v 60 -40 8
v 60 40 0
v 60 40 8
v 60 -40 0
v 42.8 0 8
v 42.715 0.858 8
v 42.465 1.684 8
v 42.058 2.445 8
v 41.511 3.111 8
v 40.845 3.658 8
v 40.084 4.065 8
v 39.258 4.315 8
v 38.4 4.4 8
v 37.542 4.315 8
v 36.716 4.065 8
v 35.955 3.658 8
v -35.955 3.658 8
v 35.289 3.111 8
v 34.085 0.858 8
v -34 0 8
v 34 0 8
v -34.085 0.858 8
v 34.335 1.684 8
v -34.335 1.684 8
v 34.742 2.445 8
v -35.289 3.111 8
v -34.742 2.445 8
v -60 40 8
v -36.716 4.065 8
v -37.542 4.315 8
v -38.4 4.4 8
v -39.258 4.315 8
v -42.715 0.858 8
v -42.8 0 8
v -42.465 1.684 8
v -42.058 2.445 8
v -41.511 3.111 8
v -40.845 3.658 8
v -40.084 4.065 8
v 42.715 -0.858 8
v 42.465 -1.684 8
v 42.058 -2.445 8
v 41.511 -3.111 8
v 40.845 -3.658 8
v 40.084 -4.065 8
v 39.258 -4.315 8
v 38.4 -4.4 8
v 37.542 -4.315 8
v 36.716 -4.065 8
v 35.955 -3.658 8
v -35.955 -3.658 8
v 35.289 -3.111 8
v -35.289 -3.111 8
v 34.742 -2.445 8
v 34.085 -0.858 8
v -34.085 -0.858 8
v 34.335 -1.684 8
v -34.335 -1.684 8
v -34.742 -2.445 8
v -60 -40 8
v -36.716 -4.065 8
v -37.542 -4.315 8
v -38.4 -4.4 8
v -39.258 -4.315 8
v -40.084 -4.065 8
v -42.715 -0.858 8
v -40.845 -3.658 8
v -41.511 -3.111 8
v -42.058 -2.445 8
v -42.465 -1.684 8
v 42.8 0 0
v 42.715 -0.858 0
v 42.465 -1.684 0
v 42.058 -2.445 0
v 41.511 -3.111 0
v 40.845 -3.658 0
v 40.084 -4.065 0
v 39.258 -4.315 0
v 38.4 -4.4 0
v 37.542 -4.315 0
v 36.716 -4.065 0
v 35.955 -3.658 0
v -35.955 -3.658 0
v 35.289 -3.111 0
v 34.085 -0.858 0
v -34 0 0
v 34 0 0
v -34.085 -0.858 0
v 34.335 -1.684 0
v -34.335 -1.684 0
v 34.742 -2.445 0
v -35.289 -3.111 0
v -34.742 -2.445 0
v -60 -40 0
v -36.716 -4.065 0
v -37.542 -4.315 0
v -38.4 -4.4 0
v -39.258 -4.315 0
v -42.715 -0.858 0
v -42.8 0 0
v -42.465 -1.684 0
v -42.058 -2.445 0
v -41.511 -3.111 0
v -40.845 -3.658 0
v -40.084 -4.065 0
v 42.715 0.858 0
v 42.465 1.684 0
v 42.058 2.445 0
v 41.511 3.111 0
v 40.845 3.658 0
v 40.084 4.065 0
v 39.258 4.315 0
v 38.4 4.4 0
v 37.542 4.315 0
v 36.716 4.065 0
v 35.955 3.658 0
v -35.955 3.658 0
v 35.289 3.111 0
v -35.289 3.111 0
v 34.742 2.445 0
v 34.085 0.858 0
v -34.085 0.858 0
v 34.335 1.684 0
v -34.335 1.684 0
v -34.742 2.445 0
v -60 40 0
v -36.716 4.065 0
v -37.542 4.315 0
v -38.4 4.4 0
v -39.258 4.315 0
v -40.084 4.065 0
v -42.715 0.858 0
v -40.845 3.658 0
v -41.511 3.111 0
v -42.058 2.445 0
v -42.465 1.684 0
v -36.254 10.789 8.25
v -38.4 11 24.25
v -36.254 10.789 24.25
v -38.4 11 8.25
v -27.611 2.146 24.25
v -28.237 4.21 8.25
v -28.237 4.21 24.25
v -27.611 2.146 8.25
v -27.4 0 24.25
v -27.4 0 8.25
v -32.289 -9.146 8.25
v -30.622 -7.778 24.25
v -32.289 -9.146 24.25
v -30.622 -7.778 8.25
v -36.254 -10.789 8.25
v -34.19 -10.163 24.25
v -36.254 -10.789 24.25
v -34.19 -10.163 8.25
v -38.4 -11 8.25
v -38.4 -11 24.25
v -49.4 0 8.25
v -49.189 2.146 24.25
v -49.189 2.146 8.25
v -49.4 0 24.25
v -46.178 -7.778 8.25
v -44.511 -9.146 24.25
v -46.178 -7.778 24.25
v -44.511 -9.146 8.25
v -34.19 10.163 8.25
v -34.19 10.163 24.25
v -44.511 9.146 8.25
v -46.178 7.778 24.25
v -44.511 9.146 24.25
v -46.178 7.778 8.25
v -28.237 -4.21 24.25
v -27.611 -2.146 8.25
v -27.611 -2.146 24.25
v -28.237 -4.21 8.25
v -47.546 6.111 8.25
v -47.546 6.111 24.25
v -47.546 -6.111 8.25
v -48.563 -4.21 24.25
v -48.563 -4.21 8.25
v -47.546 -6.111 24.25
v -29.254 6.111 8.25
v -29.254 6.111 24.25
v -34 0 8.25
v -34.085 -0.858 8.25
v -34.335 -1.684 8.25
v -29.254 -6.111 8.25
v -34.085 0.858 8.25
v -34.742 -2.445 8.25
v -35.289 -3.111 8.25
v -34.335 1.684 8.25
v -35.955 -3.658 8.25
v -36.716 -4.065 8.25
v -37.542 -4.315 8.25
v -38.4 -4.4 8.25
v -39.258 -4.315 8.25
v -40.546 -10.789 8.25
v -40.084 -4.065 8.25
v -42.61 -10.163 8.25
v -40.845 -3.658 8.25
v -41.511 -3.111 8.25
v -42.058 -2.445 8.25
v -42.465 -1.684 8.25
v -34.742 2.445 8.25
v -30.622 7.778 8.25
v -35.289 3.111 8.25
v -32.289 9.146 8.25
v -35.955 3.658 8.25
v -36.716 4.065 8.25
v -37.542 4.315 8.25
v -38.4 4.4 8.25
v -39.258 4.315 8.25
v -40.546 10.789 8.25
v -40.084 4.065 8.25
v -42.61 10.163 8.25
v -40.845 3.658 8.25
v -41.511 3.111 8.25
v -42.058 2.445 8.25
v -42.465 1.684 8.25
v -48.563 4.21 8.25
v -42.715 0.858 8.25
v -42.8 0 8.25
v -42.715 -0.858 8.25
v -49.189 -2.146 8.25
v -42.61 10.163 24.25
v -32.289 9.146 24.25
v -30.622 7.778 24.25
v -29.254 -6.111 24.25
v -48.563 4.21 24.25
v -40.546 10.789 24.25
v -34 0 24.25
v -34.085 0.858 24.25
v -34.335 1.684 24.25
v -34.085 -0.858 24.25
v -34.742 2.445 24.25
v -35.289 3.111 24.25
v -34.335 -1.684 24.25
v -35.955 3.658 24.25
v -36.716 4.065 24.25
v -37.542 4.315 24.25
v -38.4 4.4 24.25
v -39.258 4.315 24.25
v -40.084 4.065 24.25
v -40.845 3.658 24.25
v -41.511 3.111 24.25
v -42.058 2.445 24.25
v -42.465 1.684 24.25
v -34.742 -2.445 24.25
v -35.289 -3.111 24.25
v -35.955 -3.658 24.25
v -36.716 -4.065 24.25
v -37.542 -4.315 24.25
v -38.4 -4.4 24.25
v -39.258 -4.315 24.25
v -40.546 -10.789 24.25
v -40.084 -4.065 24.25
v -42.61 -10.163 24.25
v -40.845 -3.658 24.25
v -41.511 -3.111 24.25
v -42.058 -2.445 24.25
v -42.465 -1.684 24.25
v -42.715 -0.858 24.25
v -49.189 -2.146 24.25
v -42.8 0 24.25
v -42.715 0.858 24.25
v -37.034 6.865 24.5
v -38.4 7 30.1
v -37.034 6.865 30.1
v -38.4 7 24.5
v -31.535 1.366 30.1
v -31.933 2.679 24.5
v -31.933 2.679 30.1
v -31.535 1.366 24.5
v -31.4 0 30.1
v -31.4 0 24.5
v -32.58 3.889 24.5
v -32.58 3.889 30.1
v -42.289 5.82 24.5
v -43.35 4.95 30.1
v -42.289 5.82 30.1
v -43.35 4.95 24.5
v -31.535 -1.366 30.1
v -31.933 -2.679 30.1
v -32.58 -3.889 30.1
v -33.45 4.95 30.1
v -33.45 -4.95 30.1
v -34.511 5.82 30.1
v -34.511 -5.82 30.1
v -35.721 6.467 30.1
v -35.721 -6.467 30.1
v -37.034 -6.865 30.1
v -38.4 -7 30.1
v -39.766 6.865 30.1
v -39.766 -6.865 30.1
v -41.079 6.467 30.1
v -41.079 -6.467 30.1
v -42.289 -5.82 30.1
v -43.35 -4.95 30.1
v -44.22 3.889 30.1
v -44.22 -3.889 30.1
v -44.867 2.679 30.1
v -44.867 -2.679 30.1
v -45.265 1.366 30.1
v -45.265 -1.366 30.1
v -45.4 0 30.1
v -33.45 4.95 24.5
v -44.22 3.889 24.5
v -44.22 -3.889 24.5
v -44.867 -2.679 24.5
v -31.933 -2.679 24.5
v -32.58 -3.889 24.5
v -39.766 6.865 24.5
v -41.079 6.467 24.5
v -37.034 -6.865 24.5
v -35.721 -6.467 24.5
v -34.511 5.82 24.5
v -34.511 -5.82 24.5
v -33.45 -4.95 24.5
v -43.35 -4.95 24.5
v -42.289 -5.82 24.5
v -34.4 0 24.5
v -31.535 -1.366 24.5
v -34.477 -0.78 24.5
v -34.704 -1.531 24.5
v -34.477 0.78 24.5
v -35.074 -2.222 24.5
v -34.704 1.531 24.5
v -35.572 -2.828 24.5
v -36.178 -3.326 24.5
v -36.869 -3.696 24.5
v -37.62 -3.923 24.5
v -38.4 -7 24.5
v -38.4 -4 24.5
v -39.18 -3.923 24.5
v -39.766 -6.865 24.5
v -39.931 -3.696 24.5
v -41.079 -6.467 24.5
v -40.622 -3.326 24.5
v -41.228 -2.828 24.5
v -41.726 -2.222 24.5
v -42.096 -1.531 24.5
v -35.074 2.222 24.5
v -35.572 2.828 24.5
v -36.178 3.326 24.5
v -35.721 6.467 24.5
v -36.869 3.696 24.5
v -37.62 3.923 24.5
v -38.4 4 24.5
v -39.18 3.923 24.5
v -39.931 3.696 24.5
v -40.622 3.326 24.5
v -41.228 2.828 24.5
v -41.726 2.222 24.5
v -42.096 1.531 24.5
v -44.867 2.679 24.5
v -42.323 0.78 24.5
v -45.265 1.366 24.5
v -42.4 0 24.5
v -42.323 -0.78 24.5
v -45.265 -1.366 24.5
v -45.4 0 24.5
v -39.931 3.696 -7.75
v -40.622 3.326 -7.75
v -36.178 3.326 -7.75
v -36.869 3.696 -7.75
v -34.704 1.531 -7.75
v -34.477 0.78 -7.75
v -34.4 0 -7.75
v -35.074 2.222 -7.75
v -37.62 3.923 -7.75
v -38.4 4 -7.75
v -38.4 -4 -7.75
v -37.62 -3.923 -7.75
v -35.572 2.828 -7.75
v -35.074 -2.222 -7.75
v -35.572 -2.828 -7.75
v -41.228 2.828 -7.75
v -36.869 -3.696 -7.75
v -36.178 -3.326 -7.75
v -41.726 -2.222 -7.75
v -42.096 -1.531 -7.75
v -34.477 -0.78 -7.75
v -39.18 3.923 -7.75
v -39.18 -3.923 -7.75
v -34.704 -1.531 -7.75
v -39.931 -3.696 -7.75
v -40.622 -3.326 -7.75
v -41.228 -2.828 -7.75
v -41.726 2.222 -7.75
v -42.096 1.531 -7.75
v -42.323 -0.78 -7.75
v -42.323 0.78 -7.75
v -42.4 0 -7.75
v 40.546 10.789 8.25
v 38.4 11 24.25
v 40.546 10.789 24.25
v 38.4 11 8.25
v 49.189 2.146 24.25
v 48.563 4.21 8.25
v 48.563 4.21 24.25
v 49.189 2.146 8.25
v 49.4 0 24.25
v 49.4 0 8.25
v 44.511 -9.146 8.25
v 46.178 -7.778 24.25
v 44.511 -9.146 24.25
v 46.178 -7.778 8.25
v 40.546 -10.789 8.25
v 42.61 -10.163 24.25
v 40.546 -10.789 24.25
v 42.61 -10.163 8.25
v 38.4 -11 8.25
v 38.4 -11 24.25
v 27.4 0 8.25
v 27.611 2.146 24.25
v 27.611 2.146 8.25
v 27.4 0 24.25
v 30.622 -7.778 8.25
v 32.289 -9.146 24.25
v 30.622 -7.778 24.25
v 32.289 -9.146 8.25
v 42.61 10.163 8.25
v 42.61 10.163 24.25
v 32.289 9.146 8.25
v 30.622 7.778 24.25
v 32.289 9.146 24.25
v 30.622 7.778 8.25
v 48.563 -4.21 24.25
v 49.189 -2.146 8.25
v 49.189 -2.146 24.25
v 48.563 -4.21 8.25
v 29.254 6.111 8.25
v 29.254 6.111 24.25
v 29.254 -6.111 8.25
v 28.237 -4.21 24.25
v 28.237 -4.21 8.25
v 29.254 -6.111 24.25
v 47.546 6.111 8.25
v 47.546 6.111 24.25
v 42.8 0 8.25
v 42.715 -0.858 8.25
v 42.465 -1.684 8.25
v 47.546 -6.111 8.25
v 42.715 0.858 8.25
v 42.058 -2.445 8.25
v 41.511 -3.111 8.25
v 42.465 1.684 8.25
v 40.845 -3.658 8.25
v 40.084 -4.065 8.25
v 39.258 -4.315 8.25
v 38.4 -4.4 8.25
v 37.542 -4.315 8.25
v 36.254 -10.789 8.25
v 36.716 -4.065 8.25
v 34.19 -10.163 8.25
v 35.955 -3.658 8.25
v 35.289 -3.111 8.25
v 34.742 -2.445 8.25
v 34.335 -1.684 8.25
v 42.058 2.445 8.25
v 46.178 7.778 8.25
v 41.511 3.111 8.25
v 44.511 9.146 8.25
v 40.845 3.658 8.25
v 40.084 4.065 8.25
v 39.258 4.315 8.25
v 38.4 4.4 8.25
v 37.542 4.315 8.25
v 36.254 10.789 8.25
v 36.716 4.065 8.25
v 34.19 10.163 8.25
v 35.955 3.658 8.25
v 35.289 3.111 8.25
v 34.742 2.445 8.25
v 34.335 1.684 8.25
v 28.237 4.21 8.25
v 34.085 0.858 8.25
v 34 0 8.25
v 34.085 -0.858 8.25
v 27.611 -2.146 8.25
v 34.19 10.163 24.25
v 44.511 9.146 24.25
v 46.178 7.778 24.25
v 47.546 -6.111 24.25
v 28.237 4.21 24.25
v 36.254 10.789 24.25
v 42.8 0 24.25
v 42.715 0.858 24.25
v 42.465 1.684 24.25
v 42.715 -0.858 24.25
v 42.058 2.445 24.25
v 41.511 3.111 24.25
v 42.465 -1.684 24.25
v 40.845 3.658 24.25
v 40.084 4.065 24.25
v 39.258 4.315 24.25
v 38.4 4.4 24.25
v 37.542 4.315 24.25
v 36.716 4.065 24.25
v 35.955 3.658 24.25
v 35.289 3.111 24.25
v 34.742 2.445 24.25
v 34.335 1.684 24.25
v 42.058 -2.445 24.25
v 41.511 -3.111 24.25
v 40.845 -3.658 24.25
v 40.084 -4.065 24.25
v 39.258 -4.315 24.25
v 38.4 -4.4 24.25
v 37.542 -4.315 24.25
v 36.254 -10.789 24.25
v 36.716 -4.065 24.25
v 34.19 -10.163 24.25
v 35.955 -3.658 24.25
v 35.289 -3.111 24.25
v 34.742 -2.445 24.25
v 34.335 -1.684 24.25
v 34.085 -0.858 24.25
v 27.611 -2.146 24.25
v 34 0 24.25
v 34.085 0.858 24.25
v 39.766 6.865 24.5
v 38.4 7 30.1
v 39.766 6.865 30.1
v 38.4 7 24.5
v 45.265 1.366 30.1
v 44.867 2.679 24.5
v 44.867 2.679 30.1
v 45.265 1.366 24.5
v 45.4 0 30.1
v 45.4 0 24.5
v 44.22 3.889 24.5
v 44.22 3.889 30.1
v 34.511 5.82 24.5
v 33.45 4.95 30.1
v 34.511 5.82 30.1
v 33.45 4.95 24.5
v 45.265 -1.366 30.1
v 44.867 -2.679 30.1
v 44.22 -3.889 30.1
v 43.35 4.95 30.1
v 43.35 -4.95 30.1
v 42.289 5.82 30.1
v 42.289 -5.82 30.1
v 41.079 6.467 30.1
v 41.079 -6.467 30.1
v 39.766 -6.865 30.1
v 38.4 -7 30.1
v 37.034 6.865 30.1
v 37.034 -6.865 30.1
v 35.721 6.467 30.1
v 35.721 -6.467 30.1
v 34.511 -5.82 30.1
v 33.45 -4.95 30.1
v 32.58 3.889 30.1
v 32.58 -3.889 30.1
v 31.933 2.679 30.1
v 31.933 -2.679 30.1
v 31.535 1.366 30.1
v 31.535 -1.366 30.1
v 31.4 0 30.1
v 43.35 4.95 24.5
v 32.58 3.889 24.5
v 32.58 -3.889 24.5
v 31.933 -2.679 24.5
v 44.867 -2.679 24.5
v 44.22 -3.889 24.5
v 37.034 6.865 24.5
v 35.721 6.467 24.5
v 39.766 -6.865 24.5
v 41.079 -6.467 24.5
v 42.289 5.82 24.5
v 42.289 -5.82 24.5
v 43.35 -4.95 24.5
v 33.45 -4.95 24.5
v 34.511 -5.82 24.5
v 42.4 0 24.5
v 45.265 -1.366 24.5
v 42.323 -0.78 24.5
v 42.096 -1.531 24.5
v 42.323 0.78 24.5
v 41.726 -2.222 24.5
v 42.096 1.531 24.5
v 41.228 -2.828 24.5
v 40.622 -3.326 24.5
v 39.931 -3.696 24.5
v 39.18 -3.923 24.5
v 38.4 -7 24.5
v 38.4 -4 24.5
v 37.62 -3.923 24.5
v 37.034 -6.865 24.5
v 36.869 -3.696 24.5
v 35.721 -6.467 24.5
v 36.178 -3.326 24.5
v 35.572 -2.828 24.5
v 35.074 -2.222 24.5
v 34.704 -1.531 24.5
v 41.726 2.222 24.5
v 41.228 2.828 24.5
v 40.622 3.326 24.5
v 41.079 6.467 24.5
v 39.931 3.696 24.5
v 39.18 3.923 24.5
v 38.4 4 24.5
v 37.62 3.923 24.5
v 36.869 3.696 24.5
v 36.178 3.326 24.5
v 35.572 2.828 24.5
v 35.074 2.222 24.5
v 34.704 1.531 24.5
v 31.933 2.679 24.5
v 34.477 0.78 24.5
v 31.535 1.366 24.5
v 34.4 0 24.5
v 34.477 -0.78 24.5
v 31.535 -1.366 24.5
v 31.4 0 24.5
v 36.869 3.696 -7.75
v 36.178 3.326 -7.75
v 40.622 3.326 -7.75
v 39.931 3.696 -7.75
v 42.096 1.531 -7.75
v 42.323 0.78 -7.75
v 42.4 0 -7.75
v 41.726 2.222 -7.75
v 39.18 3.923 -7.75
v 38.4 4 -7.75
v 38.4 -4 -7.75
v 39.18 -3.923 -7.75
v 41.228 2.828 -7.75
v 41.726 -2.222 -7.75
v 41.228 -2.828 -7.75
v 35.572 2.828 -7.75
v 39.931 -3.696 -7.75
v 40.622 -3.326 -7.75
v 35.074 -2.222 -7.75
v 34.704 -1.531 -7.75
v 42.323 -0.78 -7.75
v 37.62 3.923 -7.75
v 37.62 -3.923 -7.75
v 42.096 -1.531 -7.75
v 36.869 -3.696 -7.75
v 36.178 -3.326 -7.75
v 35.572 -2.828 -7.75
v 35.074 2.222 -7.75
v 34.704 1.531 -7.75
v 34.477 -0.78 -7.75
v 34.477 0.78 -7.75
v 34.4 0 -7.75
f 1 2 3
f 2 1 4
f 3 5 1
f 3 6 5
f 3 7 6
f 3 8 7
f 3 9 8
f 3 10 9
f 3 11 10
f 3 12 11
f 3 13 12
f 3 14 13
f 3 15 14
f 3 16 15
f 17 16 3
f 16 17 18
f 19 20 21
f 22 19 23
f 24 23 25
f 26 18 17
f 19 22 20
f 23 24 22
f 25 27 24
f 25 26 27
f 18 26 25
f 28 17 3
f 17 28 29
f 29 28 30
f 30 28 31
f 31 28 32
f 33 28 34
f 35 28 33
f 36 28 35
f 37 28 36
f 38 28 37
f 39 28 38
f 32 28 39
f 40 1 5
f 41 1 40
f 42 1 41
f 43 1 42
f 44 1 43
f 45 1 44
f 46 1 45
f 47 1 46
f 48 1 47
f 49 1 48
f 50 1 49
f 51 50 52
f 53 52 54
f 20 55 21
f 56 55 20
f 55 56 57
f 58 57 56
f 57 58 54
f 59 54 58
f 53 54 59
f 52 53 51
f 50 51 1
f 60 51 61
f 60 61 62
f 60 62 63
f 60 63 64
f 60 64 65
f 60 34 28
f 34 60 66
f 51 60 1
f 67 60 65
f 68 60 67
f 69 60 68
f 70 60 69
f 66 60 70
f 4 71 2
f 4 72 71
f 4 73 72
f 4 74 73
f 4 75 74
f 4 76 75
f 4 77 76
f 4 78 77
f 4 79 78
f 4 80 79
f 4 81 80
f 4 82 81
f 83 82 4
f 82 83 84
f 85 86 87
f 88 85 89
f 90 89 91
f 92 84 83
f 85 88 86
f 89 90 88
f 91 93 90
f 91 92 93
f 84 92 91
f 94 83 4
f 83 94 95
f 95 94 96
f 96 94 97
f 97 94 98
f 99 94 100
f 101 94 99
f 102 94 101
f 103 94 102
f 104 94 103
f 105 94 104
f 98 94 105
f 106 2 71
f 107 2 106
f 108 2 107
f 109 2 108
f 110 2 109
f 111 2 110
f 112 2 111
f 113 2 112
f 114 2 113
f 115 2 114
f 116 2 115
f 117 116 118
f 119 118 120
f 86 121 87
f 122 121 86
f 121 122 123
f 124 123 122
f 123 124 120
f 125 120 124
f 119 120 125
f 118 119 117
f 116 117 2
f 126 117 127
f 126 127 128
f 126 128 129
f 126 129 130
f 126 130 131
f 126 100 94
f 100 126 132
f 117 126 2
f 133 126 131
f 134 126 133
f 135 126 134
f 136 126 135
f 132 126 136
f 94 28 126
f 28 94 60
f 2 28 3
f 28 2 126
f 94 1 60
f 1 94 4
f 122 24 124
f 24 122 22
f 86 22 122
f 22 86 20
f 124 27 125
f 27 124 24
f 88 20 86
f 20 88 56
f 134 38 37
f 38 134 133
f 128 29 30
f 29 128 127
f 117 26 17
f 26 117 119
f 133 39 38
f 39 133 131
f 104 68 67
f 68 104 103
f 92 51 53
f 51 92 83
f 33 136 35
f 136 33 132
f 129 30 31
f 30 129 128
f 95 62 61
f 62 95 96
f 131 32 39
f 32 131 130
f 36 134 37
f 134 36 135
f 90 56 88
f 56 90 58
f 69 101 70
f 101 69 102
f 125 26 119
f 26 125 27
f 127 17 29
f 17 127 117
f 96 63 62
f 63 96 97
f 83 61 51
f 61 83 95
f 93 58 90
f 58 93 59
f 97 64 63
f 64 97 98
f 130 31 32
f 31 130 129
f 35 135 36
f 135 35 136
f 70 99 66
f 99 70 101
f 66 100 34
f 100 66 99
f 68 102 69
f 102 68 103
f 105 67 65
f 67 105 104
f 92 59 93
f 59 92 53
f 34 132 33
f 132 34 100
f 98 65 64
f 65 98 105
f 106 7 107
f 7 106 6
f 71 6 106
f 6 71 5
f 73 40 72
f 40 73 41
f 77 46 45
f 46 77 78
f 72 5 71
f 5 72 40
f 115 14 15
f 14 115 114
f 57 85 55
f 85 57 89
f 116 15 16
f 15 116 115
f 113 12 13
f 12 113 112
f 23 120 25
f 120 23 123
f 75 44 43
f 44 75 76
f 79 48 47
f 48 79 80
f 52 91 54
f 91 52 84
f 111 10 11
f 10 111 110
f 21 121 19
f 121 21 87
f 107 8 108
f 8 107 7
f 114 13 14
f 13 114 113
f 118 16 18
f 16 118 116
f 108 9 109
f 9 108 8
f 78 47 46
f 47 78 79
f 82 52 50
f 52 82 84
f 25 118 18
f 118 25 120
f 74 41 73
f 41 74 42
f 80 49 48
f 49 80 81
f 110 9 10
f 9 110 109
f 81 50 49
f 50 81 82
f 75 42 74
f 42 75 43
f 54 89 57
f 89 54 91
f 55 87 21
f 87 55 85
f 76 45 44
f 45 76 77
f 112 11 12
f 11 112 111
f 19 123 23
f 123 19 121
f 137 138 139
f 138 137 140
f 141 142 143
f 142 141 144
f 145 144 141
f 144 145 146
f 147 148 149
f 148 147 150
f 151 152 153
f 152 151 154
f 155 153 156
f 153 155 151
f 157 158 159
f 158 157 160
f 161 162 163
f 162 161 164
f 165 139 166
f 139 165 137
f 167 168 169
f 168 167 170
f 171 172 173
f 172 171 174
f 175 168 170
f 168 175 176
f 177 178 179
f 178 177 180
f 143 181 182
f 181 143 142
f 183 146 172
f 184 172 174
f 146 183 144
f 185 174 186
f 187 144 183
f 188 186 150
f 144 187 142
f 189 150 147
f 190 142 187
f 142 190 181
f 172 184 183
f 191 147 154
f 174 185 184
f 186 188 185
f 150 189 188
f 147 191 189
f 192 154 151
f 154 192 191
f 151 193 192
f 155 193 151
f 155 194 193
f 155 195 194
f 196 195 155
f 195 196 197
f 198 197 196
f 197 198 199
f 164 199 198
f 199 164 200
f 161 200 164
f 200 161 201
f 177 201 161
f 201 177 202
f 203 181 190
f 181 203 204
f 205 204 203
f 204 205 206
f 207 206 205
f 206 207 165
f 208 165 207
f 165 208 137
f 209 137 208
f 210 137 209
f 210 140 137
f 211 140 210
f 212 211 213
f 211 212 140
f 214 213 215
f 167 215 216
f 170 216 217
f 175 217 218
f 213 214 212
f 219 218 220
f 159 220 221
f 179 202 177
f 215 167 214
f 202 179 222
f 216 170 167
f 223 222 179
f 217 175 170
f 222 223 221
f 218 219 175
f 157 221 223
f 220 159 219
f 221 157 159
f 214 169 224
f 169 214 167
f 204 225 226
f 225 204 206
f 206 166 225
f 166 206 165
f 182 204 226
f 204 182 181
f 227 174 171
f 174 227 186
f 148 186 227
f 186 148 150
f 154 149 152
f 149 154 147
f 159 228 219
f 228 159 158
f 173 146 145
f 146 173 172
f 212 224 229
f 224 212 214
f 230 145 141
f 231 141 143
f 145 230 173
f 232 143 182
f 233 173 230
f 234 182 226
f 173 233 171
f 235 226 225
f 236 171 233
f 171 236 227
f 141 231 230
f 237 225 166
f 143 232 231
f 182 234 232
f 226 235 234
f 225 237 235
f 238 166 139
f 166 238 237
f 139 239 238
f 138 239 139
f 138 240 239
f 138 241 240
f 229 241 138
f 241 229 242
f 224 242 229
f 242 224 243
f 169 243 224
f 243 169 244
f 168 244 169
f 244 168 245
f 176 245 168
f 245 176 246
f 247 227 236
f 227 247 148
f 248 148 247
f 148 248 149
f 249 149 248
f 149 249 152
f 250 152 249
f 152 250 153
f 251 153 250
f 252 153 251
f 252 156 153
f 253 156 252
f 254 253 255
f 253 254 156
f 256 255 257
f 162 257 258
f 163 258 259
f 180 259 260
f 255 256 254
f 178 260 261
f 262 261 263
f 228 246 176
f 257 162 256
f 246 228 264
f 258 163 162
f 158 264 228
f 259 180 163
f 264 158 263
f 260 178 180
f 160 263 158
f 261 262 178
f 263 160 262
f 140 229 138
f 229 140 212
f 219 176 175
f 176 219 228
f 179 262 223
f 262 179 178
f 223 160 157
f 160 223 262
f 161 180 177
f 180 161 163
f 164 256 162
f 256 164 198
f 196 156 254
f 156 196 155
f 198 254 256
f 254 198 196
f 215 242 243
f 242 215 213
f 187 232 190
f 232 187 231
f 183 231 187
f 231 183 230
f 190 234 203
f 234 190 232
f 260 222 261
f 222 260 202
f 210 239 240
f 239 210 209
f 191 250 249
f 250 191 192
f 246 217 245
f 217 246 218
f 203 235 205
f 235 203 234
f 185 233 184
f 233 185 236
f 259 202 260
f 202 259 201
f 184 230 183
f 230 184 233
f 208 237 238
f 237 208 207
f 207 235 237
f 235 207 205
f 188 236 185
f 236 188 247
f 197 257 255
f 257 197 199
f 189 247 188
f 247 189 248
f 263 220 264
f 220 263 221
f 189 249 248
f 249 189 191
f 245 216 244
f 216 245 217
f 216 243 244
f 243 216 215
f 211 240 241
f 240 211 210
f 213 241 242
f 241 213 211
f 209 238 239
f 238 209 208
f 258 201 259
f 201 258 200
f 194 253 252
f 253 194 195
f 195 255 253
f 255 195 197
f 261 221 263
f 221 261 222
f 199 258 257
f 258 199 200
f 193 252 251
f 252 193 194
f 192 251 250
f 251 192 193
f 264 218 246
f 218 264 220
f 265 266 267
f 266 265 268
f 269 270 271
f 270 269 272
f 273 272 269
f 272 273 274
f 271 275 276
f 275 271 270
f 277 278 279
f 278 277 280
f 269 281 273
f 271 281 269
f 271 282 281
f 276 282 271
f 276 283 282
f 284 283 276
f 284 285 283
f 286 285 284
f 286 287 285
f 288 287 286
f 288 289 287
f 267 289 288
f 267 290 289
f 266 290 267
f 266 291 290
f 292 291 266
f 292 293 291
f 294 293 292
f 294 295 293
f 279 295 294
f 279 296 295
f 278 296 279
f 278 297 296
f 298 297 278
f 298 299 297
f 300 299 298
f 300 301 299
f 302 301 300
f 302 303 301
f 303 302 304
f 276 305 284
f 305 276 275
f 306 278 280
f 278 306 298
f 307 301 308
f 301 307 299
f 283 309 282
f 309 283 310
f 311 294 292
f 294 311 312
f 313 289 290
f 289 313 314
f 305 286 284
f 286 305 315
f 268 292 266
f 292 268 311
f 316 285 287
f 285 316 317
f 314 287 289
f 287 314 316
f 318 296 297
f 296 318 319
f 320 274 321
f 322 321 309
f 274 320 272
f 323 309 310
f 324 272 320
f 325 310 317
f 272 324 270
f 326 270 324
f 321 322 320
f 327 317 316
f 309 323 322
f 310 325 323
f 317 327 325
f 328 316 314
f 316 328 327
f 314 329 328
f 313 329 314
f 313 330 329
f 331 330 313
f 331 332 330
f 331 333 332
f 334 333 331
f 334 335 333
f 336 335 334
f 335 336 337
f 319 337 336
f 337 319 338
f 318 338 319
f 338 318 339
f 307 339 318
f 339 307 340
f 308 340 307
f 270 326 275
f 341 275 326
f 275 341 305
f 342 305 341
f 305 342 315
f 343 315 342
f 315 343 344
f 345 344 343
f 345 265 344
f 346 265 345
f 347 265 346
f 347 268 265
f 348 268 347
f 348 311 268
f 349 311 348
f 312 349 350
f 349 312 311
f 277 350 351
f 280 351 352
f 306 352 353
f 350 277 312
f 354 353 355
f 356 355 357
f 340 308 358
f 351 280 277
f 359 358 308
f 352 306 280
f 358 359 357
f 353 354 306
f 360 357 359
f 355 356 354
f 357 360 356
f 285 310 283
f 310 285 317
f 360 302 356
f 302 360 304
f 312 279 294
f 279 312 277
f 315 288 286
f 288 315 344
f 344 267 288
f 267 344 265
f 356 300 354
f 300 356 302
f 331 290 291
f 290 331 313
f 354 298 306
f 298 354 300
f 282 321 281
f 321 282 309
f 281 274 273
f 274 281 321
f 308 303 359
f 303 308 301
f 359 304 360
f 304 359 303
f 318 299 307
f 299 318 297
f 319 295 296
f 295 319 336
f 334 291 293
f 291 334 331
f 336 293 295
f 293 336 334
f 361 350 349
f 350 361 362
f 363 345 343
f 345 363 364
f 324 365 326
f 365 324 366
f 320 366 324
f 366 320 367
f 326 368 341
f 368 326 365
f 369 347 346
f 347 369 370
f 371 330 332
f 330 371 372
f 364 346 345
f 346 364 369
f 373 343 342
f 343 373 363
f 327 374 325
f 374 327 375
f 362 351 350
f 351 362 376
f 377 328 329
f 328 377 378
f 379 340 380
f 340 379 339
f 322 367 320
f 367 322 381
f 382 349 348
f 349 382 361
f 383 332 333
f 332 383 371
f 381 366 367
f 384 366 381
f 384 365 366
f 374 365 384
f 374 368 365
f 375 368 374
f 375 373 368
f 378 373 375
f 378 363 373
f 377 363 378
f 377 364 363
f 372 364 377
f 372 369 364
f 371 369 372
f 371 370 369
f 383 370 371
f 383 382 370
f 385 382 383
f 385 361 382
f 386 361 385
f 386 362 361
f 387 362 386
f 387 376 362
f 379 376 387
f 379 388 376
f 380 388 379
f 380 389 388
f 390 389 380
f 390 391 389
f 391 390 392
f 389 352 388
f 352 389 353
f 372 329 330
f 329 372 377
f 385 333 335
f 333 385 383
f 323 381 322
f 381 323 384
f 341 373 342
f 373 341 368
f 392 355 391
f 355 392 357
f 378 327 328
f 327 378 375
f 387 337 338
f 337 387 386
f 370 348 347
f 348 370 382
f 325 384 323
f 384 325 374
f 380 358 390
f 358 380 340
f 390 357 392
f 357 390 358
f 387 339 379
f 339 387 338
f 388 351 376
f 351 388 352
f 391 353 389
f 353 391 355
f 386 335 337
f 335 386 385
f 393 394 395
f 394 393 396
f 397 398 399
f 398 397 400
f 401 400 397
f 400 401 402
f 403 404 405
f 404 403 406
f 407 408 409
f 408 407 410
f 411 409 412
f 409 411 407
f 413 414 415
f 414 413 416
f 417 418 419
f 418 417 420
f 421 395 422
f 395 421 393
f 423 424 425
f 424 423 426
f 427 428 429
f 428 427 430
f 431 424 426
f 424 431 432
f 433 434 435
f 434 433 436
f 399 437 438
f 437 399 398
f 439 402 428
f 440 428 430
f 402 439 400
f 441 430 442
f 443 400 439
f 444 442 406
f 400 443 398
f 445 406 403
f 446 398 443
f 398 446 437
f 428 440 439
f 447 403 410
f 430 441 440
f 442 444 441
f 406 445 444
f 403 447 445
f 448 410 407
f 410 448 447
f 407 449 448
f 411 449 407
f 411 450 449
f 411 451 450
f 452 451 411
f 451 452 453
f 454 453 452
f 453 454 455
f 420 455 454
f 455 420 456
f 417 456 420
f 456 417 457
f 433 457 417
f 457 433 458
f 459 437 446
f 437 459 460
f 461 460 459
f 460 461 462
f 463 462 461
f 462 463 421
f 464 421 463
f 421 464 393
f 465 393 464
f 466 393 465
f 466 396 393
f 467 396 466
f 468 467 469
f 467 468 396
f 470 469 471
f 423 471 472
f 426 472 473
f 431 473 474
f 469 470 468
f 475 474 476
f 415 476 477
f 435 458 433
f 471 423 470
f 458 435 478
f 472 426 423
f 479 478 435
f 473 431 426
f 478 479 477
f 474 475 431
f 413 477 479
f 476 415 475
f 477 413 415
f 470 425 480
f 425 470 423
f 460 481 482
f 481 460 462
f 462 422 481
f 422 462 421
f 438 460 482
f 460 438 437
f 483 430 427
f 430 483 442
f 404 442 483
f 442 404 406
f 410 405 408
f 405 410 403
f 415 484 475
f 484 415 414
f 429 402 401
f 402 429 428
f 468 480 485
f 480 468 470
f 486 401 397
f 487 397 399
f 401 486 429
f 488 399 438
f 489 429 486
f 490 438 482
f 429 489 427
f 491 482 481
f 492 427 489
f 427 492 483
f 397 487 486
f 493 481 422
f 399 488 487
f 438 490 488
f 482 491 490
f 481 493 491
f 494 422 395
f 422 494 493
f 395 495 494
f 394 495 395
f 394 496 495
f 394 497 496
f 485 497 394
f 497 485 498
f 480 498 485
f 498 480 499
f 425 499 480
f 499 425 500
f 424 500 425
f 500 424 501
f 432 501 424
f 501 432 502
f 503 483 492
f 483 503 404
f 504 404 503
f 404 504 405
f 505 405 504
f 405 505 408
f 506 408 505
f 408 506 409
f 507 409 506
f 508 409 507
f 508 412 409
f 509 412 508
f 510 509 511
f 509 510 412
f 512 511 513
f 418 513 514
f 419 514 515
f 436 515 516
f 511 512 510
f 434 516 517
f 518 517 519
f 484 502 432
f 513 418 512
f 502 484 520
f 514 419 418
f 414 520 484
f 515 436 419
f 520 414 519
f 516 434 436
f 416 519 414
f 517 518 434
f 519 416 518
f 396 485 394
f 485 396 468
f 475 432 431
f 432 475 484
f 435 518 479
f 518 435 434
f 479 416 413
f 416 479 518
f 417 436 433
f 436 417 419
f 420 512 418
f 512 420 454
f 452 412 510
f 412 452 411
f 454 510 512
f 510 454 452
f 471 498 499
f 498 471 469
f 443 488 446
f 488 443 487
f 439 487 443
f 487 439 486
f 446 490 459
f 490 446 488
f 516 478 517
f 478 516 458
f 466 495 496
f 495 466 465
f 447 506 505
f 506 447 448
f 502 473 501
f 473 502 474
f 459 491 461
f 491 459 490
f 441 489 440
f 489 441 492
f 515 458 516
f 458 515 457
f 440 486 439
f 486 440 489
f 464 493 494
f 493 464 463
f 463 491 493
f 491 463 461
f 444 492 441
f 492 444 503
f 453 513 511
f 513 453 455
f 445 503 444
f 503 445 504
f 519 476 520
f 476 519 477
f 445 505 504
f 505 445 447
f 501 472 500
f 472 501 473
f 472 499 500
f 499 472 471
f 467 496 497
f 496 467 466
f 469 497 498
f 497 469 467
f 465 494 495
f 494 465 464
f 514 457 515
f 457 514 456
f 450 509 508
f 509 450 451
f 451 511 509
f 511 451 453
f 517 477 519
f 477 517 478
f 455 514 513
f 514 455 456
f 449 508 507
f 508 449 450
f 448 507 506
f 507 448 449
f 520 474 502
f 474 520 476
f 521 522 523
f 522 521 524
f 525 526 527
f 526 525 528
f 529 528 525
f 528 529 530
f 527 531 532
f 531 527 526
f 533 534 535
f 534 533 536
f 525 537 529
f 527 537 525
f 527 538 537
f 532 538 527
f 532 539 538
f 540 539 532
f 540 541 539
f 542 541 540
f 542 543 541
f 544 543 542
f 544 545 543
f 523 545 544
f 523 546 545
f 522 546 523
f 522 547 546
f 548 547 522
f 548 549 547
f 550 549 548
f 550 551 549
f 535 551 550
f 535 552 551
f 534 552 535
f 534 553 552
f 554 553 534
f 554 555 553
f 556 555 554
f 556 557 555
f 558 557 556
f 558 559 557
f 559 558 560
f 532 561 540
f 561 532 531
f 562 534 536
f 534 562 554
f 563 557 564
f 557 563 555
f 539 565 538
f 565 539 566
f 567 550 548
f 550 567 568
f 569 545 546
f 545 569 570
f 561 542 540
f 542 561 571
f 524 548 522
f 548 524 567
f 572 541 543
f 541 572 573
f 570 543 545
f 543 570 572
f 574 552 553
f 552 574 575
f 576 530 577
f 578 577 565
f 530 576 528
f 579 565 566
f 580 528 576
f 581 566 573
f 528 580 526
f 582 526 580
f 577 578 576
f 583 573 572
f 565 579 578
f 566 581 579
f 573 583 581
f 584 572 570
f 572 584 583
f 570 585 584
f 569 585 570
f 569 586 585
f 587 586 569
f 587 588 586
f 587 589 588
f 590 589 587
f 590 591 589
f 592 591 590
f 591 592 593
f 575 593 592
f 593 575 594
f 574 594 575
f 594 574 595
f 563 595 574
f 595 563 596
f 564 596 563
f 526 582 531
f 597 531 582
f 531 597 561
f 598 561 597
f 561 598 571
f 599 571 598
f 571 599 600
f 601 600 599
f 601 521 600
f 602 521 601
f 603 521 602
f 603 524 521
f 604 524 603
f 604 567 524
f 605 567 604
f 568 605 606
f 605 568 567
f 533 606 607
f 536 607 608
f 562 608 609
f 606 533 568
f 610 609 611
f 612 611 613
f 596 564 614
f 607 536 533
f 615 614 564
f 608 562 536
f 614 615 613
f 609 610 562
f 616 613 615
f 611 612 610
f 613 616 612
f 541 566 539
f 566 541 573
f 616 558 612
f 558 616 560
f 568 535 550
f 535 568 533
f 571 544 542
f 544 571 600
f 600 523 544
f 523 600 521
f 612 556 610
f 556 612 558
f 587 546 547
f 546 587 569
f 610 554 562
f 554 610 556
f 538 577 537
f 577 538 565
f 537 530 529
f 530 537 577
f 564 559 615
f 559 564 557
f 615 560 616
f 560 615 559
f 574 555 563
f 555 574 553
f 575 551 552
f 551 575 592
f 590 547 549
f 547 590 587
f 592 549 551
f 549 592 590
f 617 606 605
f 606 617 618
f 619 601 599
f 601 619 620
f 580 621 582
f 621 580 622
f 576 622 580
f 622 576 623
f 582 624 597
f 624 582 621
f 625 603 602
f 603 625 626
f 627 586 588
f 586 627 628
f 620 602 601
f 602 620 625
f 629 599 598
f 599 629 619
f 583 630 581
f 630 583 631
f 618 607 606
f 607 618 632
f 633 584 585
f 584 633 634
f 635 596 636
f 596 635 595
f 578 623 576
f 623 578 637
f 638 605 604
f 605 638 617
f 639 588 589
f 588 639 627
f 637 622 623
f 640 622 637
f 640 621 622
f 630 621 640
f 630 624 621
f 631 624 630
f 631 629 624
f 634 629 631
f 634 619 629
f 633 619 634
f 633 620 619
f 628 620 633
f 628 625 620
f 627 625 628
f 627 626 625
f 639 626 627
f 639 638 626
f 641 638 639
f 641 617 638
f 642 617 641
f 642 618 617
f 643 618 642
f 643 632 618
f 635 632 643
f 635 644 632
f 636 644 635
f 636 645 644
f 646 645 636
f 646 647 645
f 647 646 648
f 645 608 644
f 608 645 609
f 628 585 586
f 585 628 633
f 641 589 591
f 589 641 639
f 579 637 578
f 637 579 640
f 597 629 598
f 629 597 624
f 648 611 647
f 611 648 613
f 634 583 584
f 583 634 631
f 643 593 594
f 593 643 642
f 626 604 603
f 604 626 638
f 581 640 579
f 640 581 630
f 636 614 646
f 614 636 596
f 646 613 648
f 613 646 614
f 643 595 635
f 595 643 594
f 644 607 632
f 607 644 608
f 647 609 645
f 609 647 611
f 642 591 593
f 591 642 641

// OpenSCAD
$fn = 32;

// ------------------------------------------------------------------------
// Standoff columns: 2 d22 standoffs, bolts d8
// Every part is its own module, assembly() places them once.
// ------------------------------------------------------------------------

// --- part 1 ---
module base_plate() {
  difference() {
    translate([-60, -40, 0]) cube([120, 80, 8]);
    translate([-38.4, 0, -1]) cylinder(h = 10, d = 8.8);
    translate([38.4, 0, -1]) cylinder(h = 10, d = 8.8);
  }
}

// --- part 2 ---
module spacer1() {
  difference() {
      translate([0, 0, 0]) cylinder(h = 16, d = 22);
      translate([0, 0, -1]) cylinder(h = 18, d = 8.8);
    }
}

// --- part 3 ---
module bolt1() {
  cylinder(h = 5.6, d = 14);
  translate([0, 0, -32.25]) cylinder(h = 32.25, d = 8);
}

// --- part 4 ---
module spacer2() {
  difference() {
      translate([0, 0, 0]) cylinder(h = 16, d = 22);
      translate([0, 0, -1]) cylinder(h = 18, d = 8.8);
    }
}

// --- part 5 ---
module bolt2() {
  cylinder(h = 5.6, d = 14);
  translate([0, 0, -32.25]) cylinder(h = 32.25, d = 8);
}

// --- assembly ---
module assembly() {
  translate([0, 0, 0]) rotate([0, 0, 0]) base_plate();
  translate([-38.4, 0, 8.25]) rotate([0, 0, 0]) spacer1();
  translate([-38.4, 0, 24.5]) rotate([0, 0, 0]) bolt1();
  translate([38.4, 0, 8.25]) rotate([0, 0, 0]) spacer2();
  translate([38.4, 0, 24.5]) rotate([0, 0, 0]) bolt2();
}

assembly();
